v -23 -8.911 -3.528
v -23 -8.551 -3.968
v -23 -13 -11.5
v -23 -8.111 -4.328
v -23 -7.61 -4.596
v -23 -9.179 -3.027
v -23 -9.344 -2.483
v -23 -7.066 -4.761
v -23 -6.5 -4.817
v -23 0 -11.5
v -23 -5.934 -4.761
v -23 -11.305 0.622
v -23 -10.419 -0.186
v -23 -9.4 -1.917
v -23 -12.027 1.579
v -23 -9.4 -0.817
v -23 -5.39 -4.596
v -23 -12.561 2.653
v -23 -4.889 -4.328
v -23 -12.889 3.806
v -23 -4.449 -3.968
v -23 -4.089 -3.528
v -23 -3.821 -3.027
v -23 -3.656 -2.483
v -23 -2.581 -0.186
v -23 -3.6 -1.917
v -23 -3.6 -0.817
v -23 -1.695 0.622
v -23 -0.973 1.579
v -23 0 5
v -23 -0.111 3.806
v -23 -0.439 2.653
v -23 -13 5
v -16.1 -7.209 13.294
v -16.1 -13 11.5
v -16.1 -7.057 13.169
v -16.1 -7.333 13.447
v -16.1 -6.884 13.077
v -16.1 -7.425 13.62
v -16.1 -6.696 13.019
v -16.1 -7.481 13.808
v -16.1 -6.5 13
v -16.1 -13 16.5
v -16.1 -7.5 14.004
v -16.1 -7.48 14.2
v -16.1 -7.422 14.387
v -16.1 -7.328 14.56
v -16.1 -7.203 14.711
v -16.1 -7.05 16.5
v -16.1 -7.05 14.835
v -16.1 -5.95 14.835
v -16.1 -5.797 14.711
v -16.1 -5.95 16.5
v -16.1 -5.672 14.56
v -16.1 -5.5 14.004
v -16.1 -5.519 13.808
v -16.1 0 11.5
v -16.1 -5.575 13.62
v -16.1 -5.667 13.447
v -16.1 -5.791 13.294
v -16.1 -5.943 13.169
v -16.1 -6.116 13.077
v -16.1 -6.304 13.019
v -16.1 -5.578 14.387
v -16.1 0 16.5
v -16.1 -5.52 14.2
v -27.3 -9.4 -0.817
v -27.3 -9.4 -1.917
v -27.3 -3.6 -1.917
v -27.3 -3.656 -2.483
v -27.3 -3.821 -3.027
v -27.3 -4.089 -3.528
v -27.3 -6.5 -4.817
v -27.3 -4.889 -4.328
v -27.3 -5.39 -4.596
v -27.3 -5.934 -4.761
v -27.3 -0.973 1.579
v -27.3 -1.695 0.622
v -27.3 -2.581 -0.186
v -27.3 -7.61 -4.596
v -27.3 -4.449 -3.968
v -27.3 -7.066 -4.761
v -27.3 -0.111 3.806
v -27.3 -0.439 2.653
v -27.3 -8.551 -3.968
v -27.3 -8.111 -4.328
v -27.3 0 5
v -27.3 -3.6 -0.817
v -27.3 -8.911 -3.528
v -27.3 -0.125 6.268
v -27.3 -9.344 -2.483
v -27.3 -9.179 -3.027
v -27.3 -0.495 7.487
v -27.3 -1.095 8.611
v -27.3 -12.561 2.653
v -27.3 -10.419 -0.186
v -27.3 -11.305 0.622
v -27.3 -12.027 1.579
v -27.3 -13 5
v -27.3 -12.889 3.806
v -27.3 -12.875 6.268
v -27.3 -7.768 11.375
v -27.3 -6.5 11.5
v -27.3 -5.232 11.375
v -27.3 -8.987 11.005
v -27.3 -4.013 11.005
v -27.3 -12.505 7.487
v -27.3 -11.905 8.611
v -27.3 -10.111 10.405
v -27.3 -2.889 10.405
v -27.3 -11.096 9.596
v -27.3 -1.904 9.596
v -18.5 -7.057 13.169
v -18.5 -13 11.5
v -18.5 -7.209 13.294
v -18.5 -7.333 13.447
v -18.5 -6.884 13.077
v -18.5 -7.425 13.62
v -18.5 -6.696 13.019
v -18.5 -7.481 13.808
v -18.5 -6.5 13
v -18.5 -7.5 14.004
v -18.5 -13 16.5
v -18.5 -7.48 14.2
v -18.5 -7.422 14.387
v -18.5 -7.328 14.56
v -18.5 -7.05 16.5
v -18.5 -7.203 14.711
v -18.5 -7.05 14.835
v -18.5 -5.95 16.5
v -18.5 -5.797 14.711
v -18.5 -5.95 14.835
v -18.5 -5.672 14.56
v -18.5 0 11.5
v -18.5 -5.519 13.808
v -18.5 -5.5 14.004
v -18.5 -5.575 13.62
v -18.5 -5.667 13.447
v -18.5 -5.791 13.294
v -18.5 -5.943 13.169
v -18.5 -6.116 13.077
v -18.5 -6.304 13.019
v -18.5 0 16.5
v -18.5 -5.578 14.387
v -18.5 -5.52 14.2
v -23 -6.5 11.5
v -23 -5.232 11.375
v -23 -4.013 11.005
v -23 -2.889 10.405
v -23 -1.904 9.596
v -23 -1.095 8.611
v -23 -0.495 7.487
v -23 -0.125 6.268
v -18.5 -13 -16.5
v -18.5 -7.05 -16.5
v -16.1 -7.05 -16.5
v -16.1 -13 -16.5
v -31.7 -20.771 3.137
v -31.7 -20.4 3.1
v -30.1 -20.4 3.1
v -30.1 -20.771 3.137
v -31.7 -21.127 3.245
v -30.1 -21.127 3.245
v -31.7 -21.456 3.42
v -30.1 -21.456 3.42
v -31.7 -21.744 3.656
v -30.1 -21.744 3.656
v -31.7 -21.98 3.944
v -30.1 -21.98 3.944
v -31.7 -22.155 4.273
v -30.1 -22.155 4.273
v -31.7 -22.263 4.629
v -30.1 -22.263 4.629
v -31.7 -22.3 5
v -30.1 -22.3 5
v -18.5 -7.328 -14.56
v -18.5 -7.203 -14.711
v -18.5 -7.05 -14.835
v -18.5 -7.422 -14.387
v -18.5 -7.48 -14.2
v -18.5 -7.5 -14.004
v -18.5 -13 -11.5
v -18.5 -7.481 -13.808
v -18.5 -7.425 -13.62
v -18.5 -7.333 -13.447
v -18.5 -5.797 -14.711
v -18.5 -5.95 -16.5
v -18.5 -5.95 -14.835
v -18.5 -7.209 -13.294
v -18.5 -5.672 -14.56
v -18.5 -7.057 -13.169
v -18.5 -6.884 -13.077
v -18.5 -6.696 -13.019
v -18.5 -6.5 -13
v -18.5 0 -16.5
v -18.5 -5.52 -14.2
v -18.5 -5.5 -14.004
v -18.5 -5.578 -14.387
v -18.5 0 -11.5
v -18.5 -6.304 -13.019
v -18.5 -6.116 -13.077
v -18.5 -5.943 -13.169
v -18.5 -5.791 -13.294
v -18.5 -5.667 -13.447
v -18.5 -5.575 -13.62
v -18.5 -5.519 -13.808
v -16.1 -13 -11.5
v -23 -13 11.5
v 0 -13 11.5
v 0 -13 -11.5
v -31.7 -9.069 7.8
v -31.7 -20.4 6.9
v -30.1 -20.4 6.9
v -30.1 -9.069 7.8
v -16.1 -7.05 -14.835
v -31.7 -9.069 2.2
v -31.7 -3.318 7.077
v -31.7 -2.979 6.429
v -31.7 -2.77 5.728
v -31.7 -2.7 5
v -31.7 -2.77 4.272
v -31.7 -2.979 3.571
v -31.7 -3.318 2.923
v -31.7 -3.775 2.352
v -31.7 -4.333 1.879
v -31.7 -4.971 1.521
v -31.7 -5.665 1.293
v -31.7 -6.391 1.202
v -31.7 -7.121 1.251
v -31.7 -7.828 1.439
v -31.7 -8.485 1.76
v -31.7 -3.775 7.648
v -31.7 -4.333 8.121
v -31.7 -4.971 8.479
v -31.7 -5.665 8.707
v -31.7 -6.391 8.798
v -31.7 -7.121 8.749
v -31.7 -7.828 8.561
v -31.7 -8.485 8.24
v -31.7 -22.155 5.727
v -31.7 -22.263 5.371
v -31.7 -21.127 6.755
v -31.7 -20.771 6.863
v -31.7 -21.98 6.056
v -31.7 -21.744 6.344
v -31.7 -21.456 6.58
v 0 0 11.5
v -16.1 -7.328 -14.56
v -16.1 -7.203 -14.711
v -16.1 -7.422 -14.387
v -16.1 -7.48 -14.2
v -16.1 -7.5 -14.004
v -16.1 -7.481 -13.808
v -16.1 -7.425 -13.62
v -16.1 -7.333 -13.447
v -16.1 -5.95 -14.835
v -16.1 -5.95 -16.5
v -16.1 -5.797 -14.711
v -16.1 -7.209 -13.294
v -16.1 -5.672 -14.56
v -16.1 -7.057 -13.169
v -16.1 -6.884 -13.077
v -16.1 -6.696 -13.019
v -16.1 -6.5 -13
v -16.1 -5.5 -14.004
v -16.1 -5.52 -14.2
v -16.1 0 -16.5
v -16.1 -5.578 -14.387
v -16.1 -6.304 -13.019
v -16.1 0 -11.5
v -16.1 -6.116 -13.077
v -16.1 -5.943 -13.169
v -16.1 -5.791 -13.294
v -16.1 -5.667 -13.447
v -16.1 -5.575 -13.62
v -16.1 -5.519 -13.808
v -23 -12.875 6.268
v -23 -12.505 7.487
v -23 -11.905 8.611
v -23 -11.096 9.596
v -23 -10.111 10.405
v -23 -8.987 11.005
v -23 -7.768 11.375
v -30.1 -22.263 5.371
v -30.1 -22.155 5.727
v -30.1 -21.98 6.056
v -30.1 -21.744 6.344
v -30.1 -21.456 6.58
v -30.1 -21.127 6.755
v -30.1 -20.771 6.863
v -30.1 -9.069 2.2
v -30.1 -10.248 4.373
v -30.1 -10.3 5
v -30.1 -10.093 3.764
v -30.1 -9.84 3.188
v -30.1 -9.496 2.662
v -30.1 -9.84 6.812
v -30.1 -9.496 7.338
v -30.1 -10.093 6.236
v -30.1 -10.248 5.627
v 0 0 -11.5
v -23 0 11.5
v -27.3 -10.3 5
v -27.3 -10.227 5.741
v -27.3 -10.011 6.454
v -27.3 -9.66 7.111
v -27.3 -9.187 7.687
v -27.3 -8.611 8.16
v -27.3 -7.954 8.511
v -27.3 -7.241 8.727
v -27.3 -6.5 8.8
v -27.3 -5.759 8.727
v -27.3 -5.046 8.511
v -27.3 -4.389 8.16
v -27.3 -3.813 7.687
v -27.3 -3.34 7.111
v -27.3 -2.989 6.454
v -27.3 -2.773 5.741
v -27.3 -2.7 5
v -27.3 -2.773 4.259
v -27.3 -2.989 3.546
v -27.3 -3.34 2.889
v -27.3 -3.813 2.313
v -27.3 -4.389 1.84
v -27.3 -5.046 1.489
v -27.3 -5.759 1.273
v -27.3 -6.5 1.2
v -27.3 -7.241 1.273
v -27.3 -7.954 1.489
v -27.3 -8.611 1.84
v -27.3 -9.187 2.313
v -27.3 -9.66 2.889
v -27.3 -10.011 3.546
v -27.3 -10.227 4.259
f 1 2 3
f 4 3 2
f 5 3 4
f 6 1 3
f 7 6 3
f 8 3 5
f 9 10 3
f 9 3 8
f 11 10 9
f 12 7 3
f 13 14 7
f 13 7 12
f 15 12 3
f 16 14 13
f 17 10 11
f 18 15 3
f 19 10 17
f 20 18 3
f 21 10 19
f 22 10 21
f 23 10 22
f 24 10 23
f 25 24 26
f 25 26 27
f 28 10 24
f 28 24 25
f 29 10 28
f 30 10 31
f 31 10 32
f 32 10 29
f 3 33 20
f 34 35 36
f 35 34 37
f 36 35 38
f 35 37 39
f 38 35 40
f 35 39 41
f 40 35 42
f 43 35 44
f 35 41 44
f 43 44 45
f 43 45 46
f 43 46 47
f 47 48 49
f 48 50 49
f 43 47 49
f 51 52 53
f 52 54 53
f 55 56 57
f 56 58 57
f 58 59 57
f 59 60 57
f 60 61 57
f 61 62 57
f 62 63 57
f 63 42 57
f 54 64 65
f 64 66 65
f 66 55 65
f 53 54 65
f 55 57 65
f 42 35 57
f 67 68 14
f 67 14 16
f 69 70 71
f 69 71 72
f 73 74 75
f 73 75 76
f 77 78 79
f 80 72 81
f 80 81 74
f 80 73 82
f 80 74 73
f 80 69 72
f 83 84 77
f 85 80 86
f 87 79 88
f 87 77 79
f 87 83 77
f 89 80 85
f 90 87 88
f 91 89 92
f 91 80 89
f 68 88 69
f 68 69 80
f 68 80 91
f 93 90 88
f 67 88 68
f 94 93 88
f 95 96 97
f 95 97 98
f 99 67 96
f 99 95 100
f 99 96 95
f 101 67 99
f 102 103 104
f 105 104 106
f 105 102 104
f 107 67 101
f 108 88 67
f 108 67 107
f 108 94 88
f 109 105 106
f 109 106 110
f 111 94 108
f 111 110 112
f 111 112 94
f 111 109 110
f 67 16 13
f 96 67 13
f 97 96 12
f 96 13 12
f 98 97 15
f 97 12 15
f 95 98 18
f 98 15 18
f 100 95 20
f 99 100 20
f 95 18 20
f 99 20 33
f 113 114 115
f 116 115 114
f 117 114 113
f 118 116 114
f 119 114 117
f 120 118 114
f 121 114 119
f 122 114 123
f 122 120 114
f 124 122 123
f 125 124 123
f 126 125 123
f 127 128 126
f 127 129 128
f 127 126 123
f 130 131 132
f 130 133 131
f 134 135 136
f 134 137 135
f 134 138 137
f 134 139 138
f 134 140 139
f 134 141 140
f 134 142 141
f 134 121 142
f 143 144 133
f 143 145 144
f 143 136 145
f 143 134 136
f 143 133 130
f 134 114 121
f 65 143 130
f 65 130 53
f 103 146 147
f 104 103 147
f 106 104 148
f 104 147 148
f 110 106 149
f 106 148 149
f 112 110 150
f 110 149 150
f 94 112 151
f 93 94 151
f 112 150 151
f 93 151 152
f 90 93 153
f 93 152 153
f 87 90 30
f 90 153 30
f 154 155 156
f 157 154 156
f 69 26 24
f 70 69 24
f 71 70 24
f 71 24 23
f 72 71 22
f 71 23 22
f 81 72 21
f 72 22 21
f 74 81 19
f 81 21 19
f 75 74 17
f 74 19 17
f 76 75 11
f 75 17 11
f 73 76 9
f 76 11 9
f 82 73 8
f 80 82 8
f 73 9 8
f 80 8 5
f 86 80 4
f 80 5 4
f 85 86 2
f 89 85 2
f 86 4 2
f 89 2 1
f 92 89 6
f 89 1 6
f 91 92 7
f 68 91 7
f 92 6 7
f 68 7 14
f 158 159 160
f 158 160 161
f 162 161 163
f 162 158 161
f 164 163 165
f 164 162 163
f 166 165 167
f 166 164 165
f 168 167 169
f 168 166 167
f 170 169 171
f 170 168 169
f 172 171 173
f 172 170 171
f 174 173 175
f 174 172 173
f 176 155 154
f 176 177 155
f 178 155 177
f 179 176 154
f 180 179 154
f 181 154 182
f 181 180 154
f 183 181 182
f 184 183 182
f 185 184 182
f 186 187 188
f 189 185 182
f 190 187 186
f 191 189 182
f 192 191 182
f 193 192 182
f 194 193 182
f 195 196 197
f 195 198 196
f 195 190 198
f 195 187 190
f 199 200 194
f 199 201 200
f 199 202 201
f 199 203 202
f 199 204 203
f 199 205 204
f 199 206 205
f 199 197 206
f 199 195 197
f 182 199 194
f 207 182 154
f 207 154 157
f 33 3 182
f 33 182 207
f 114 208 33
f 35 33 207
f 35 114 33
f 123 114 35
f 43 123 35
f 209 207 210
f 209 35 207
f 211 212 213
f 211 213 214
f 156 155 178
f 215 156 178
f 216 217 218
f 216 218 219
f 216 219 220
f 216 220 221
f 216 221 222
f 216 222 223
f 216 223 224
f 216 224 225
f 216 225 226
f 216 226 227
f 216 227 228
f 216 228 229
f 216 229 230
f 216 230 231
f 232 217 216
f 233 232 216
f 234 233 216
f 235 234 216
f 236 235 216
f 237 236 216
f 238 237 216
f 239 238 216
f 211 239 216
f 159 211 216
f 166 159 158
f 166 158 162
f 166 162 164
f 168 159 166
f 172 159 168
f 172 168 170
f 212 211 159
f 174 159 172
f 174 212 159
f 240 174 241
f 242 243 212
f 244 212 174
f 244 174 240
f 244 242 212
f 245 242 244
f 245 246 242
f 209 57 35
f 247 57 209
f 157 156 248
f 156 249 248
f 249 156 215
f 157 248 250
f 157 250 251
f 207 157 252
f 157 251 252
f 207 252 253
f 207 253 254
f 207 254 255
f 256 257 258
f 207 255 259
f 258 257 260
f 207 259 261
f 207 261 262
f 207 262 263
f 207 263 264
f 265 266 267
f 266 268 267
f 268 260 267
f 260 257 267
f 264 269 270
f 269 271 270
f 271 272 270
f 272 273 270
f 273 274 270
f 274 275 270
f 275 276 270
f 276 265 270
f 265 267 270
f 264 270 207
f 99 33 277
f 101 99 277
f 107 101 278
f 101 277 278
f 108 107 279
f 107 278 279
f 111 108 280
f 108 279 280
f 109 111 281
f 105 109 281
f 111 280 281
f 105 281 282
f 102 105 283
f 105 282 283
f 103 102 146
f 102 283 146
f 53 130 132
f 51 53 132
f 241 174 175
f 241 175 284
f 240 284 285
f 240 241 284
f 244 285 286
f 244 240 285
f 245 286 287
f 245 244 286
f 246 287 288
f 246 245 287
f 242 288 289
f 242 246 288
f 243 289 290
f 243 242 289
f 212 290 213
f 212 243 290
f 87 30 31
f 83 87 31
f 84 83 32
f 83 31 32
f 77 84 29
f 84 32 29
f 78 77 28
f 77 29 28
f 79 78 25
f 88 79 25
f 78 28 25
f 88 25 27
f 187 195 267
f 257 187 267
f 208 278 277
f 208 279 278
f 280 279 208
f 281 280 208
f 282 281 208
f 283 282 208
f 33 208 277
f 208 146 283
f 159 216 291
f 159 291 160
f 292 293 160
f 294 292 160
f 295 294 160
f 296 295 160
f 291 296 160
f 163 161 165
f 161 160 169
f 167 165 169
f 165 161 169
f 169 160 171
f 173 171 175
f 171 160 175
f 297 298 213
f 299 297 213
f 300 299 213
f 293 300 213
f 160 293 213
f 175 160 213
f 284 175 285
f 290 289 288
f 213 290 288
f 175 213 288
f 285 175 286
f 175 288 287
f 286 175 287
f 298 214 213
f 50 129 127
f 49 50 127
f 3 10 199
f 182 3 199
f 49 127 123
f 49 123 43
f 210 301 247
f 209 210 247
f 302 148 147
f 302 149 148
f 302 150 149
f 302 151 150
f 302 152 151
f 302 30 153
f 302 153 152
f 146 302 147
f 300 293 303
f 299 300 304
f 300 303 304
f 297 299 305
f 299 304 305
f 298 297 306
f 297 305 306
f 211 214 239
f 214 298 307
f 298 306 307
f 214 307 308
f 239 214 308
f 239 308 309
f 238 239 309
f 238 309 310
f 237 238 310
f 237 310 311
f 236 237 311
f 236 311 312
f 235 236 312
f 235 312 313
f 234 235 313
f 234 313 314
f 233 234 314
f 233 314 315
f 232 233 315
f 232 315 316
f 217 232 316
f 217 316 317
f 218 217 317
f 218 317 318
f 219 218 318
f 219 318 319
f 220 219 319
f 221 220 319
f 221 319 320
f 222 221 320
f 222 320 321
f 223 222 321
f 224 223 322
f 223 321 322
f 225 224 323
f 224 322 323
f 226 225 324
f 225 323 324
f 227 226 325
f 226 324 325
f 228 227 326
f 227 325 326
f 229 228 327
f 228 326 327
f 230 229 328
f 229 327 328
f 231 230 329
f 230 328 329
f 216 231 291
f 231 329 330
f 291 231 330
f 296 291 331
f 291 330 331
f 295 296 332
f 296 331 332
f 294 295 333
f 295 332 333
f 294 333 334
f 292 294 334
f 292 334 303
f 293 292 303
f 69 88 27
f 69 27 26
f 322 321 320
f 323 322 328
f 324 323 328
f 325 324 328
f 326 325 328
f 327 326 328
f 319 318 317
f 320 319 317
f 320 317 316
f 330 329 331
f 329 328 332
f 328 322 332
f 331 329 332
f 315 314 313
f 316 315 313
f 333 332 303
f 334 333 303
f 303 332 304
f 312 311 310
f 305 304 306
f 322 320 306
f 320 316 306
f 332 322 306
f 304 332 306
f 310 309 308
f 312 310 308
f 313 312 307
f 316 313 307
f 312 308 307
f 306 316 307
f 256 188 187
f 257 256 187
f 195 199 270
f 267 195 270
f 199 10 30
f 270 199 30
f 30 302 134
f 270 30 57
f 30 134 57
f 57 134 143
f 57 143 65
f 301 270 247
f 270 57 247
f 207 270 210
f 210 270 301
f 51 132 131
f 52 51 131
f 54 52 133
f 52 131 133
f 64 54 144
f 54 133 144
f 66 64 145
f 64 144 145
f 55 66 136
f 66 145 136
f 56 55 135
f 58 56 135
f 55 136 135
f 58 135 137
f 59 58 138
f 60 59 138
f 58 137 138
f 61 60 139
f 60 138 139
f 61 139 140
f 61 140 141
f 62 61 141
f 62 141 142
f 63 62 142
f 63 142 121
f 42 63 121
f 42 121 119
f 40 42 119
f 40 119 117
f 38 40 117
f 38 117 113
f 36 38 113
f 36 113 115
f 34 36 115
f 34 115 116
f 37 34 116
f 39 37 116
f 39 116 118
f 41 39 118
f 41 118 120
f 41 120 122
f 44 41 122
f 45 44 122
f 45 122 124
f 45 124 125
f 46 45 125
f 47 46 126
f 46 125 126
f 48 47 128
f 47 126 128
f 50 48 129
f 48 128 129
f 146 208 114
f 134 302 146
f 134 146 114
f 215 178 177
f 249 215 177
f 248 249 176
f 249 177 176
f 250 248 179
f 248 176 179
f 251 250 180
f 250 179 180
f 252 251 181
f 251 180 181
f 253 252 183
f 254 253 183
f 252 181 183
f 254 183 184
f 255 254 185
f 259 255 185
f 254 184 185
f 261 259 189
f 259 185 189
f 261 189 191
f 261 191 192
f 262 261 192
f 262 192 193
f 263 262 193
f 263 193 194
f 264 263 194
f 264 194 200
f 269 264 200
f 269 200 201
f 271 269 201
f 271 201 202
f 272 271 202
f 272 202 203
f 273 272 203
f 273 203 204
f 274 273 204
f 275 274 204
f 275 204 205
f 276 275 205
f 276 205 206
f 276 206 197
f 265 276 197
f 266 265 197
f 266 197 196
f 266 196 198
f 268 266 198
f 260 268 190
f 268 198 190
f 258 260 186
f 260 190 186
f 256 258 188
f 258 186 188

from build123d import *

# Parameters (mm, degrees)
F0_W     = 4.5
F0_H     = 23
F0_W_2   = 2.4
F0_H_2   = 5
F0_W_3   = 16.1
F1_DEPTH = 13
F3_DEPTH = 4.3
F5_DEPTH = 18.501
F6_R     = 3.8
F7_DEPTH = 4.4
F9_DEPTH = 1.6


with BuildPart() as f1:
    # F0 (on Front) → F1 (new body)
    with BuildSketch(Plane.XZ):
        with Locations((-20.75, 0)):
            Rectangle(F0_W, F0_H)
        with Locations((-17.3, 14)):
            Rectangle(F0_W_2, F0_H_2)
        with Locations((-8.05, 0)):
            Rectangle(F0_W_3, F0_H)
        with Locations((-17.3, -14)):
            Rectangle(F0_W_2, F0_H_2)
        with Locations((-17.3, 0)):
            Rectangle(F0_W_2, F0_H)
    extrude(amount=F1_DEPTH)

    # F2 (on face) → F3 (join)
    with BuildSketch(Plane(origin=(-23, 0, 0), x_dir=(0, -1, 0), z_dir=(-1, 0, 0))):
        with BuildLine():
            Line((9.4, -1.9172158289), (9.4, -0.8172158289))
            ThreePointArc((9.4, -0.8172158289), (12.0272054422, 1.5794737247), (13, 5))
            ThreePointArc((13, 5), (11.0961940777, 9.5961940777), (6.5, 11.5))
            ThreePointArc((6.5, 11.5), (1.9038059223, 9.5961940777), (0, 5))
            ThreePointArc((0, 5), (0.9727945578, 1.5794737247), (3.6, -0.8172158289))
            Line((3.6, -0.8172158289), (3.6, -1.9172158289))
            ThreePointArc((3.6, -1.9172158289), (6.5, -4.8172158289), (9.4, -1.9172158289))
        make_face()
    extrude(amount=F3_DEPTH)

    # F4 (on face) → F5 (cut, through all)
    with BuildSketch(Plane(origin=(-18.5, 0, 0), x_dir=(0, -1, 0), z_dir=(-1, 0, 0))):
        with BuildLine():
            Line((5.95, 16.5), (5.95, 14.8351646544))
            ThreePointArc((5.95, 14.8351646544), (6.5, 13), (7.05, 14.8351646544))
            Line((7.05, 14.8351646544), (7.05, 16.5))
            Line((7.05, 16.5), (5.95, 16.5))
        make_face()
        with BuildLine():
            Line((7.05, -16.5), (7.05, -14.8351646544))
            ThreePointArc((7.05, -14.8351646544), (6.5, -13), (5.95, -14.8351646544))
            Line((5.95, -14.8351646544), (5.95, -16.5))
            Line((5.95, -16.5), (7.05, -16.5))
        make_face()
    extrude(amount=-F5_DEPTH, mode=Mode.SUBTRACT)


with BuildPart() as f7:
    # F6 (on face) → F7 (new body)
    with BuildSketch(Plane(origin=(-27.3, 0, 0), x_dir=(0, -1, 0), z_dir=(-1, 0, 0))):
        with Locations((6.5, 5)):
            Circle(F6_R)
    extrude(amount=F7_DEPTH)

    # F8 (on face) → F9 (join)
    with BuildSketch(Plane(origin=(-31.7, 0, 0), x_dir=(0, -1, 0), z_dir=(-1, 0, 0))):
        with BuildLine():
            ThreePointArc((20.4, 3.1), (18.5, 5), (20.4, 6.9))
            Line((20.4, 6.9), (9.0690465157, 7.8))
            ThreePointArc((9.0690465157, 7.8), (9.9786762396, 6.5293173706), (10.3, 5))
            ThreePointArc((10.3, 5), (9.9786762396, 3.4706826294), (9.0690465157, 2.2))
            Line((9.0690465157, 2.2), (20.4, 3.1))
        make_face()
        with BuildLine():
            ThreePointArc((20.4, 3.1), (21.7435028843, 3.6564971157), (22.3, 5))
            ThreePointArc((22.3, 5), (21.7435028843, 6.3435028843), (20.4, 6.9))
            ThreePointArc((20.4, 6.9), (18.5, 5), (20.4, 3.1))
        make_face()
    extrude(amount=-F9_DEPTH)


solid = Compound([f1.part, f7.part])
